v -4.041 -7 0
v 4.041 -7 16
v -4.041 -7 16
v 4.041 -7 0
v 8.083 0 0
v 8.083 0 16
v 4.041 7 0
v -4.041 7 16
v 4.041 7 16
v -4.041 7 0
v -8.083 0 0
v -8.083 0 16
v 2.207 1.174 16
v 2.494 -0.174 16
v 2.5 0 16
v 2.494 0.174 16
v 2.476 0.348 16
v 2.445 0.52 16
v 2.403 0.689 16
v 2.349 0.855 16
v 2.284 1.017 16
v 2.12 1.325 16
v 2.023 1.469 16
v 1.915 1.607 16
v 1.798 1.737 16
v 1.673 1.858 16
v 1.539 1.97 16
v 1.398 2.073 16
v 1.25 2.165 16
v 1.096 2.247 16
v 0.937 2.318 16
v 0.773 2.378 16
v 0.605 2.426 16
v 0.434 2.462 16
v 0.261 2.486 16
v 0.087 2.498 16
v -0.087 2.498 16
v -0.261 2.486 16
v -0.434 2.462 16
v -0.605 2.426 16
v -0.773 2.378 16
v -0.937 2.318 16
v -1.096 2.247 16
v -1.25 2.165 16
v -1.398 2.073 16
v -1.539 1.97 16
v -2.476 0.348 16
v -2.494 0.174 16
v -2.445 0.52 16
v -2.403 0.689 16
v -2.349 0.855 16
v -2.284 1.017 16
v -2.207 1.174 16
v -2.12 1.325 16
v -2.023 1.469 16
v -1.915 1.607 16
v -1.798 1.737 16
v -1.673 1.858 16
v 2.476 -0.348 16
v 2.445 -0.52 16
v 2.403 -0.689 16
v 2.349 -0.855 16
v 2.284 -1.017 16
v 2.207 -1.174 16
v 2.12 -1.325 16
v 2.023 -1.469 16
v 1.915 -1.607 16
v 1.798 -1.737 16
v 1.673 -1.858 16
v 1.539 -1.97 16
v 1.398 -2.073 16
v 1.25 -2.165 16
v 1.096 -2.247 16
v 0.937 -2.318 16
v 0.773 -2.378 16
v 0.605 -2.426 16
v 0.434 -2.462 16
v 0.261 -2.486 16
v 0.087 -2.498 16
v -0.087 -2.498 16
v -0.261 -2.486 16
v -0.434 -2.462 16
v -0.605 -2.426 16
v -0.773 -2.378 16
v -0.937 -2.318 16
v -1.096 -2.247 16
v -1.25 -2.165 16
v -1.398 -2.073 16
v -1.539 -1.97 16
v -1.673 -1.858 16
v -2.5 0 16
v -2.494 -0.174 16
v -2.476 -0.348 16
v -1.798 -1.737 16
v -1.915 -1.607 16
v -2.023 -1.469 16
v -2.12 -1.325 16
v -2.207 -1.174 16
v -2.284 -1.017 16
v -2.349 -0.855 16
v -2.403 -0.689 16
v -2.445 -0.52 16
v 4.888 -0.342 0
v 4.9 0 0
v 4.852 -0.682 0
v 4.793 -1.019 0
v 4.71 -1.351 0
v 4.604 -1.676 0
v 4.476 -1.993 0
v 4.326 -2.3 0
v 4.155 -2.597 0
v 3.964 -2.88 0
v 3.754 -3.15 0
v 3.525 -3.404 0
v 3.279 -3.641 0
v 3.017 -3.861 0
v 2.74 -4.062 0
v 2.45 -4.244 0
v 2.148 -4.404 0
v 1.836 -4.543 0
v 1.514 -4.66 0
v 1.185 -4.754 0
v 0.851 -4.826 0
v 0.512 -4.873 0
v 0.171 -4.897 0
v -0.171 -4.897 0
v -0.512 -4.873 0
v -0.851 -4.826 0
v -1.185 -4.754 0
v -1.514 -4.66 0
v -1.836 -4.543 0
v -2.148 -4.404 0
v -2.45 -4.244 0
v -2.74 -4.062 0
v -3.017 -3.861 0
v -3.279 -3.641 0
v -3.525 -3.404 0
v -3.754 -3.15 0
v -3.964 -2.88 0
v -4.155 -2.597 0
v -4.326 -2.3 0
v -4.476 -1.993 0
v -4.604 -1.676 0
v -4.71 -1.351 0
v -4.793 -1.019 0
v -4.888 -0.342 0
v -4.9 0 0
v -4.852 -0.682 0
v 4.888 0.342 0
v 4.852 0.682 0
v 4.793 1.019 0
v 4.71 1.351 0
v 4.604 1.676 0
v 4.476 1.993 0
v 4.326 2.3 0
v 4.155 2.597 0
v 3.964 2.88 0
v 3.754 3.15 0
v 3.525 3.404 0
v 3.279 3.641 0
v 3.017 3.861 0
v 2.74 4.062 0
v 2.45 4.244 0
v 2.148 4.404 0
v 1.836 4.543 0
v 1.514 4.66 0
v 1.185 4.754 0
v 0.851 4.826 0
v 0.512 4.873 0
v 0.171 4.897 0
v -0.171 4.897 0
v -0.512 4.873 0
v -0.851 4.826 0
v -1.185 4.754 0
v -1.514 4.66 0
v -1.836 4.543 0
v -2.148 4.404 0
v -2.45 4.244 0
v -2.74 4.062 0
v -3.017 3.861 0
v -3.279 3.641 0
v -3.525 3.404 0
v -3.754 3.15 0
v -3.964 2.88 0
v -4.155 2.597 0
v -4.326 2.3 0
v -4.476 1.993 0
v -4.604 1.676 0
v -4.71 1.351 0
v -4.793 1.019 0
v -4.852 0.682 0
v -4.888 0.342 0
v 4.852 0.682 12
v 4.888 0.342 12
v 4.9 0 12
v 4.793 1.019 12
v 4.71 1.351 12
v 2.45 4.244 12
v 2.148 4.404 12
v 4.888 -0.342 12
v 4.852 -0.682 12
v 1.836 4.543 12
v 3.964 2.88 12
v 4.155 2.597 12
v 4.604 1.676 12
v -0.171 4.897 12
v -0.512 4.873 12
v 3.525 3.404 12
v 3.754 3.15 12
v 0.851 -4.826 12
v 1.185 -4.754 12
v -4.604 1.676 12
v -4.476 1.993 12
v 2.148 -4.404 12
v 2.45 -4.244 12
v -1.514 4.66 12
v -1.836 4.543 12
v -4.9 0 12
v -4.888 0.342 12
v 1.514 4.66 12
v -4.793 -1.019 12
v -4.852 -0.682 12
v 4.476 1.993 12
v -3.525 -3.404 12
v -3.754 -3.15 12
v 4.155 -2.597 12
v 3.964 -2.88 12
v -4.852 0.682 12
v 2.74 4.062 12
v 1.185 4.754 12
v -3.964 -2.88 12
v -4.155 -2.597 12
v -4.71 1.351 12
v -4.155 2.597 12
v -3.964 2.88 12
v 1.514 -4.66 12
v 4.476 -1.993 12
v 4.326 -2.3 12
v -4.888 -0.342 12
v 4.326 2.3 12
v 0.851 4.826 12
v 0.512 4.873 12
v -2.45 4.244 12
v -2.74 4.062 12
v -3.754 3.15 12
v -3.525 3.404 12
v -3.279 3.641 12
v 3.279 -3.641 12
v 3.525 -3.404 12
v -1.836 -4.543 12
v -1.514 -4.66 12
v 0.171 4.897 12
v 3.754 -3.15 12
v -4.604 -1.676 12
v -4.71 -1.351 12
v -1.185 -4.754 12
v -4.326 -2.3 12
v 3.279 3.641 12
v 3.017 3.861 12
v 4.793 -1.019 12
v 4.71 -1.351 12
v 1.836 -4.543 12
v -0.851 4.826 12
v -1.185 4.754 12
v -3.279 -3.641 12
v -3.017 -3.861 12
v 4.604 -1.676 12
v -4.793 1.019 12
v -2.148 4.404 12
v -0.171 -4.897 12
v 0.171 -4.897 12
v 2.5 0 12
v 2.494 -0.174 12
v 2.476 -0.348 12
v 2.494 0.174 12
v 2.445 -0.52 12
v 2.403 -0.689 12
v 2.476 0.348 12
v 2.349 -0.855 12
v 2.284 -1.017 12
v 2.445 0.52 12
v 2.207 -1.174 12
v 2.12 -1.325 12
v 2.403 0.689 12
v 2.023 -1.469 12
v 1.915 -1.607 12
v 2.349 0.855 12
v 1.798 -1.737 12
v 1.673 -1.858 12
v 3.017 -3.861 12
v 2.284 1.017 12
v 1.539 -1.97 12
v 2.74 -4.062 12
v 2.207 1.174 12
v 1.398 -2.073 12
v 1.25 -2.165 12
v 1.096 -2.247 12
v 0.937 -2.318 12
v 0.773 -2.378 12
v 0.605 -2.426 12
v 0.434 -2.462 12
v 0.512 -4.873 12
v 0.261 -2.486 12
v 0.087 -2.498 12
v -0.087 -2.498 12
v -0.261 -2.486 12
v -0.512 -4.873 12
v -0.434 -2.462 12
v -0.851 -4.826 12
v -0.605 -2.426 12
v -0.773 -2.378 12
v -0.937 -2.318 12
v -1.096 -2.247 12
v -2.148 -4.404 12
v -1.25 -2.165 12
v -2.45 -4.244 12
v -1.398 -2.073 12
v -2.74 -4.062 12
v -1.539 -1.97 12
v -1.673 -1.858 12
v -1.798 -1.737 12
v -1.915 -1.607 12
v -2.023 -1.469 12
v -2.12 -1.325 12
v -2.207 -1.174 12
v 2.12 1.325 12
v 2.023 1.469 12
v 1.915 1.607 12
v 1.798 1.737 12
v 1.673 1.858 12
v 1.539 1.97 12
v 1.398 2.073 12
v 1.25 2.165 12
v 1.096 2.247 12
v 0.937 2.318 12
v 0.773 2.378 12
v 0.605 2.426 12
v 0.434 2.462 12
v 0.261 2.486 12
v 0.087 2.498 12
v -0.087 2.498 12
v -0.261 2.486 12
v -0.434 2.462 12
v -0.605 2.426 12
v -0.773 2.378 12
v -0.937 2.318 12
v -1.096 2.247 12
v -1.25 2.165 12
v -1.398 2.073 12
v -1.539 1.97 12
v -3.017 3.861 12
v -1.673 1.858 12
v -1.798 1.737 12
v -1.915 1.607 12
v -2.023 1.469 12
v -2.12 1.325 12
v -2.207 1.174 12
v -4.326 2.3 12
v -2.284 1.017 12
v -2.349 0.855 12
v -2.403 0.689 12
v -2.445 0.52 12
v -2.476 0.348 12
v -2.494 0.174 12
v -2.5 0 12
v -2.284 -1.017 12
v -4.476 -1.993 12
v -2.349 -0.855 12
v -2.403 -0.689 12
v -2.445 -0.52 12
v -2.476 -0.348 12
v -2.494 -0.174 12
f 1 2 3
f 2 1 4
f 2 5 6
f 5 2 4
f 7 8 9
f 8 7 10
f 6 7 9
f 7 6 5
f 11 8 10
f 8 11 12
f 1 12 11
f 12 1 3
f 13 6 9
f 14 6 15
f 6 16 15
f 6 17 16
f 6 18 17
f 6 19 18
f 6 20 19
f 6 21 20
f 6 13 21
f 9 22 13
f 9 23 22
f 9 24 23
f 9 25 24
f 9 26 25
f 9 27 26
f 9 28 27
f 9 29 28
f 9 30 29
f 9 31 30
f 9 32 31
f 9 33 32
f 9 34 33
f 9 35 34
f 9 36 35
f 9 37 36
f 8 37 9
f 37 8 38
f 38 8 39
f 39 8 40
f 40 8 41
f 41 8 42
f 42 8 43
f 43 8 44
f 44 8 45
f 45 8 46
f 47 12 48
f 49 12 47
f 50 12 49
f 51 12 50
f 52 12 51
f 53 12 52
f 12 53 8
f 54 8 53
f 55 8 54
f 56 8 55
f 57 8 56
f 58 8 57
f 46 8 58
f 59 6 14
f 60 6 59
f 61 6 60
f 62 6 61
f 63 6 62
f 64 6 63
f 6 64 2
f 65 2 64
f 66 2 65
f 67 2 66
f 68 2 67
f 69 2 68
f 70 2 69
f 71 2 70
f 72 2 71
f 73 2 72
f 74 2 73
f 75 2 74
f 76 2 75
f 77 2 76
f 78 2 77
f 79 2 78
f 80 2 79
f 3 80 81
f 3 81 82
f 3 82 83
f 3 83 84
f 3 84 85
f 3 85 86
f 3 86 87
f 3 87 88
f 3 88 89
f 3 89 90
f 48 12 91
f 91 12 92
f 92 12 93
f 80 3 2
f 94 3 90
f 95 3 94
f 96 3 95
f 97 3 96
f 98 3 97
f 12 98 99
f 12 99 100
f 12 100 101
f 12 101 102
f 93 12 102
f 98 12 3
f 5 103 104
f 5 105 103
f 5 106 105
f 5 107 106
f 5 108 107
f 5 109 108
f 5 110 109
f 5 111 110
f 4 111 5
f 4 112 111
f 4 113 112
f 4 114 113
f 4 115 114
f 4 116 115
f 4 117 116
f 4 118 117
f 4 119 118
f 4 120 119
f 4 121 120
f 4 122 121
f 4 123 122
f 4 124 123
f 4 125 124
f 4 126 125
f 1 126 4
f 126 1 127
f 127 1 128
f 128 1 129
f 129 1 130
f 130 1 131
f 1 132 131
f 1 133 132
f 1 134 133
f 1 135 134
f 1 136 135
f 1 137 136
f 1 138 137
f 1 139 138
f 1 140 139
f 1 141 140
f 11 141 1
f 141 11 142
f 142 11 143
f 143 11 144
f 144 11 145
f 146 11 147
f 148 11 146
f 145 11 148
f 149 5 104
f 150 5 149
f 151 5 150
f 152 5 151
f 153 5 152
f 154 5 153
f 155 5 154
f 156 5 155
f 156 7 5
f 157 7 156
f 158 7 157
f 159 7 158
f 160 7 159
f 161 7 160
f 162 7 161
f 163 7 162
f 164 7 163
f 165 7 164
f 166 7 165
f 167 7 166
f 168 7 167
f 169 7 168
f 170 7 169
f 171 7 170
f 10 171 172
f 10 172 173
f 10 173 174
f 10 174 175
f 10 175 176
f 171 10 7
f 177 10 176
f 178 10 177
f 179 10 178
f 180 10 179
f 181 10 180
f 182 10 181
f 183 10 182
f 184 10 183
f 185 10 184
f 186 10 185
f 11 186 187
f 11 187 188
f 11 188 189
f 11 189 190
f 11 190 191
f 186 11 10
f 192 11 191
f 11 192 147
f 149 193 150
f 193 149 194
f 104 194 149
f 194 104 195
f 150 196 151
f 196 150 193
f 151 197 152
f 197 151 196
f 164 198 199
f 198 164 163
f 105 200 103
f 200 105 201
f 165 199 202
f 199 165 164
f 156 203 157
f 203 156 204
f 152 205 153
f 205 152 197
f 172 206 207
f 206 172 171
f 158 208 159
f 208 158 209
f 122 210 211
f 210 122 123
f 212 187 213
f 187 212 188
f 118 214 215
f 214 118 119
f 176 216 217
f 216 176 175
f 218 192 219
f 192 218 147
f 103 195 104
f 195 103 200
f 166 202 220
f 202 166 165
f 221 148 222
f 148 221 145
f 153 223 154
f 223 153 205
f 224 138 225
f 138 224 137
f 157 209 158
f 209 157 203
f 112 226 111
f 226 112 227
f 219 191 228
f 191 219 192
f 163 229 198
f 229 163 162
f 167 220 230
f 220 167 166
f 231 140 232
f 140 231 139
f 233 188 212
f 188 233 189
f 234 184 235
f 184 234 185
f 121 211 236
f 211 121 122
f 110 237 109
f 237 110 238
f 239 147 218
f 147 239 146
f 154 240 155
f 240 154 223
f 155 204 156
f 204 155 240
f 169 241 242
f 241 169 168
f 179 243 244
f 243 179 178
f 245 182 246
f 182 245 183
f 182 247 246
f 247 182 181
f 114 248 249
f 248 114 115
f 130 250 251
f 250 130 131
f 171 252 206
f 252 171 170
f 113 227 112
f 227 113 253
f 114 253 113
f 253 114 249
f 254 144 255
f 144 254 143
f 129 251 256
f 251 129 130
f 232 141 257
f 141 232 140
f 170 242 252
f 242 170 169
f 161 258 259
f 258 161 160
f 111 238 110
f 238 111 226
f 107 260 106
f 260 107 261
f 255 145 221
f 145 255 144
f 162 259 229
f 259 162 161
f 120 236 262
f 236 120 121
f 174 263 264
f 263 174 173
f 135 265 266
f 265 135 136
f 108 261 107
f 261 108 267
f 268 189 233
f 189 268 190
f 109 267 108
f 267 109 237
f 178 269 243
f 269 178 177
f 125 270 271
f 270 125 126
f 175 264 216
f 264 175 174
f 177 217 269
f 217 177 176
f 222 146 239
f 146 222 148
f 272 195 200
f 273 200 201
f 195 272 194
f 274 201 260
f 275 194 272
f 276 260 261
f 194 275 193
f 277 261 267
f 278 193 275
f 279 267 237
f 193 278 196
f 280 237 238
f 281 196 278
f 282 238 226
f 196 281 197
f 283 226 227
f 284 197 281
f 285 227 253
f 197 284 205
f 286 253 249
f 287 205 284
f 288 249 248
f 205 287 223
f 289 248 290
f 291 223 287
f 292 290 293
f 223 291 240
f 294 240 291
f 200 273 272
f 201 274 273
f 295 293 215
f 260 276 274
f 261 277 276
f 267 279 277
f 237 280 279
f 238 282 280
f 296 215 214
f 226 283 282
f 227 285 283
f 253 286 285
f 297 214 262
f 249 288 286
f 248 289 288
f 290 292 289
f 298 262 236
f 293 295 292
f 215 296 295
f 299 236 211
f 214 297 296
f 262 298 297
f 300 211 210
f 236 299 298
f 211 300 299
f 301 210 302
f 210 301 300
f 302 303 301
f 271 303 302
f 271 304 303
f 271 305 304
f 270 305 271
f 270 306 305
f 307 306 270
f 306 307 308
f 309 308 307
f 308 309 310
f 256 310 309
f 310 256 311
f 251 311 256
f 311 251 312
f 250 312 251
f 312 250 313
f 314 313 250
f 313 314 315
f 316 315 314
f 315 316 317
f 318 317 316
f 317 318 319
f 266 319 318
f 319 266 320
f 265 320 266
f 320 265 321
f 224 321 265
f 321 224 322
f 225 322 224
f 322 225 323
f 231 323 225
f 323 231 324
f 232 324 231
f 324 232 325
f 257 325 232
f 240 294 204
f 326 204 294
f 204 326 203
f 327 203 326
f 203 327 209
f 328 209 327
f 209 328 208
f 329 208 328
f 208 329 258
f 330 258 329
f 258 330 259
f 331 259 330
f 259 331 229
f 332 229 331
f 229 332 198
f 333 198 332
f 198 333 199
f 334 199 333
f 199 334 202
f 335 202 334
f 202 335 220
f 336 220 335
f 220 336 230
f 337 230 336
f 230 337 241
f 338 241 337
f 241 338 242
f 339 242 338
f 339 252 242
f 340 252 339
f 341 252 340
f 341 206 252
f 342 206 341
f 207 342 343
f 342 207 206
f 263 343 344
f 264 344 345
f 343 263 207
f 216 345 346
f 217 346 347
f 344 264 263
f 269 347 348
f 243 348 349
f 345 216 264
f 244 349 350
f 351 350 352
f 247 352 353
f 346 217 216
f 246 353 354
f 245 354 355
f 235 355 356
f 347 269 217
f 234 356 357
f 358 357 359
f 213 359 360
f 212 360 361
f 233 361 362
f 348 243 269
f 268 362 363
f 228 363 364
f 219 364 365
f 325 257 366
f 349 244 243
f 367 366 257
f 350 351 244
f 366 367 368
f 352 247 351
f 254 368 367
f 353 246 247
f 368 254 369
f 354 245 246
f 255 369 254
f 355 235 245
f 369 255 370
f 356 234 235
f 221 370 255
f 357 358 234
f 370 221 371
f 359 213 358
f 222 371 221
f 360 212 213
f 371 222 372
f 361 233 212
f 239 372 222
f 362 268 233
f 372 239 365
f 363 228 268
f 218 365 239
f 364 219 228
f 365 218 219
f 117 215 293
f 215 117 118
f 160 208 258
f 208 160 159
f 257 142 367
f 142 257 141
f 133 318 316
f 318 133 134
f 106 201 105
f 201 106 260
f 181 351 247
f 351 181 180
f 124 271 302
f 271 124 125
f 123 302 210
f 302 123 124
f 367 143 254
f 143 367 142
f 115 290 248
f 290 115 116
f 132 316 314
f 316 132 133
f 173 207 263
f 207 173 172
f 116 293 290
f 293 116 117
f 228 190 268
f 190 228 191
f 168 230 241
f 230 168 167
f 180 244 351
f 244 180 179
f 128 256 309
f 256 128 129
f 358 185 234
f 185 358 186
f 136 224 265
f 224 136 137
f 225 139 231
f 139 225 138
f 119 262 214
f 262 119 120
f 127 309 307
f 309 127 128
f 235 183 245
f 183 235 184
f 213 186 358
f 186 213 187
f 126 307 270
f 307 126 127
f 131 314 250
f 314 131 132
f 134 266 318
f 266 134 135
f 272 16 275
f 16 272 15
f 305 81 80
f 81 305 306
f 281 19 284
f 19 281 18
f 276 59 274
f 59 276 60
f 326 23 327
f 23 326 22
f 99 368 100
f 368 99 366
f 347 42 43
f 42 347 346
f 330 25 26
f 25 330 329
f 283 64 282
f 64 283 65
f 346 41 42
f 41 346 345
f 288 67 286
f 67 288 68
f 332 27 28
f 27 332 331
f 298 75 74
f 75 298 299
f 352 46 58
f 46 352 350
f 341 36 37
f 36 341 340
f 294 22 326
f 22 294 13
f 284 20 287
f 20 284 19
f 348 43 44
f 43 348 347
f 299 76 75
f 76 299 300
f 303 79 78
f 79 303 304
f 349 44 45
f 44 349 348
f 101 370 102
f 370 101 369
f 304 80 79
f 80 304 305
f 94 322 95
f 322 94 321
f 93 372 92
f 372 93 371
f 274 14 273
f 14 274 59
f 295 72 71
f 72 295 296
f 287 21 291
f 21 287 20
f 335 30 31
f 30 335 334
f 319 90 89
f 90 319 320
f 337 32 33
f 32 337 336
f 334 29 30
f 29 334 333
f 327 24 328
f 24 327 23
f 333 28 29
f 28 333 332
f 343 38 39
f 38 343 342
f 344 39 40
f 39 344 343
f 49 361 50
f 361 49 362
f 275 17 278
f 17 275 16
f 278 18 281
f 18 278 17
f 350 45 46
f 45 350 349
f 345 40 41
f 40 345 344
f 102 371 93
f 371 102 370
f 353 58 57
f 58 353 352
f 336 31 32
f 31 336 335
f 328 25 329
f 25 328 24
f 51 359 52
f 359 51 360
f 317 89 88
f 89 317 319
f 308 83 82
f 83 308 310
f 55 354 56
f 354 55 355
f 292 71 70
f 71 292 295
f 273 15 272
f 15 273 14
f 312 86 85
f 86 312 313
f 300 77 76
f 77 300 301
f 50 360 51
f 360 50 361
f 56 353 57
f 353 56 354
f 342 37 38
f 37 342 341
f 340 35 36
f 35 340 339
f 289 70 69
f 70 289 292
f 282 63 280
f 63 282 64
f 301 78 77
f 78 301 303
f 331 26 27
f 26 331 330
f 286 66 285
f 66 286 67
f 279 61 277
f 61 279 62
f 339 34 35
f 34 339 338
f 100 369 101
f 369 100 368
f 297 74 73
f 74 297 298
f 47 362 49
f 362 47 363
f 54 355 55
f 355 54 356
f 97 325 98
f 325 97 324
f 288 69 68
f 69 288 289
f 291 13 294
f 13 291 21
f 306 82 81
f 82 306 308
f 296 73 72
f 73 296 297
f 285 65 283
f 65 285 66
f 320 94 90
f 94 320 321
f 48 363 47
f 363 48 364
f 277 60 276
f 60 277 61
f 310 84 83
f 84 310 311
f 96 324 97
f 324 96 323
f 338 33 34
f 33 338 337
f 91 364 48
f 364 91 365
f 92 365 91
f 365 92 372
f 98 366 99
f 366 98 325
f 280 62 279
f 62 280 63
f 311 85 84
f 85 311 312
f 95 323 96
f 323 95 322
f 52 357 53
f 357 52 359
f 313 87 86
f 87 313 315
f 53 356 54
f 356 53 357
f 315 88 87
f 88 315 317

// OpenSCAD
$fn = 90;

difference(){
	cylinder(d=14/(sqrt(3)/2), h=16, $fn=6);
	#cylinder(d=9.8, h=12);
	translate([0, 0, 12])
		#cylinder(d=5, h=4);
}
